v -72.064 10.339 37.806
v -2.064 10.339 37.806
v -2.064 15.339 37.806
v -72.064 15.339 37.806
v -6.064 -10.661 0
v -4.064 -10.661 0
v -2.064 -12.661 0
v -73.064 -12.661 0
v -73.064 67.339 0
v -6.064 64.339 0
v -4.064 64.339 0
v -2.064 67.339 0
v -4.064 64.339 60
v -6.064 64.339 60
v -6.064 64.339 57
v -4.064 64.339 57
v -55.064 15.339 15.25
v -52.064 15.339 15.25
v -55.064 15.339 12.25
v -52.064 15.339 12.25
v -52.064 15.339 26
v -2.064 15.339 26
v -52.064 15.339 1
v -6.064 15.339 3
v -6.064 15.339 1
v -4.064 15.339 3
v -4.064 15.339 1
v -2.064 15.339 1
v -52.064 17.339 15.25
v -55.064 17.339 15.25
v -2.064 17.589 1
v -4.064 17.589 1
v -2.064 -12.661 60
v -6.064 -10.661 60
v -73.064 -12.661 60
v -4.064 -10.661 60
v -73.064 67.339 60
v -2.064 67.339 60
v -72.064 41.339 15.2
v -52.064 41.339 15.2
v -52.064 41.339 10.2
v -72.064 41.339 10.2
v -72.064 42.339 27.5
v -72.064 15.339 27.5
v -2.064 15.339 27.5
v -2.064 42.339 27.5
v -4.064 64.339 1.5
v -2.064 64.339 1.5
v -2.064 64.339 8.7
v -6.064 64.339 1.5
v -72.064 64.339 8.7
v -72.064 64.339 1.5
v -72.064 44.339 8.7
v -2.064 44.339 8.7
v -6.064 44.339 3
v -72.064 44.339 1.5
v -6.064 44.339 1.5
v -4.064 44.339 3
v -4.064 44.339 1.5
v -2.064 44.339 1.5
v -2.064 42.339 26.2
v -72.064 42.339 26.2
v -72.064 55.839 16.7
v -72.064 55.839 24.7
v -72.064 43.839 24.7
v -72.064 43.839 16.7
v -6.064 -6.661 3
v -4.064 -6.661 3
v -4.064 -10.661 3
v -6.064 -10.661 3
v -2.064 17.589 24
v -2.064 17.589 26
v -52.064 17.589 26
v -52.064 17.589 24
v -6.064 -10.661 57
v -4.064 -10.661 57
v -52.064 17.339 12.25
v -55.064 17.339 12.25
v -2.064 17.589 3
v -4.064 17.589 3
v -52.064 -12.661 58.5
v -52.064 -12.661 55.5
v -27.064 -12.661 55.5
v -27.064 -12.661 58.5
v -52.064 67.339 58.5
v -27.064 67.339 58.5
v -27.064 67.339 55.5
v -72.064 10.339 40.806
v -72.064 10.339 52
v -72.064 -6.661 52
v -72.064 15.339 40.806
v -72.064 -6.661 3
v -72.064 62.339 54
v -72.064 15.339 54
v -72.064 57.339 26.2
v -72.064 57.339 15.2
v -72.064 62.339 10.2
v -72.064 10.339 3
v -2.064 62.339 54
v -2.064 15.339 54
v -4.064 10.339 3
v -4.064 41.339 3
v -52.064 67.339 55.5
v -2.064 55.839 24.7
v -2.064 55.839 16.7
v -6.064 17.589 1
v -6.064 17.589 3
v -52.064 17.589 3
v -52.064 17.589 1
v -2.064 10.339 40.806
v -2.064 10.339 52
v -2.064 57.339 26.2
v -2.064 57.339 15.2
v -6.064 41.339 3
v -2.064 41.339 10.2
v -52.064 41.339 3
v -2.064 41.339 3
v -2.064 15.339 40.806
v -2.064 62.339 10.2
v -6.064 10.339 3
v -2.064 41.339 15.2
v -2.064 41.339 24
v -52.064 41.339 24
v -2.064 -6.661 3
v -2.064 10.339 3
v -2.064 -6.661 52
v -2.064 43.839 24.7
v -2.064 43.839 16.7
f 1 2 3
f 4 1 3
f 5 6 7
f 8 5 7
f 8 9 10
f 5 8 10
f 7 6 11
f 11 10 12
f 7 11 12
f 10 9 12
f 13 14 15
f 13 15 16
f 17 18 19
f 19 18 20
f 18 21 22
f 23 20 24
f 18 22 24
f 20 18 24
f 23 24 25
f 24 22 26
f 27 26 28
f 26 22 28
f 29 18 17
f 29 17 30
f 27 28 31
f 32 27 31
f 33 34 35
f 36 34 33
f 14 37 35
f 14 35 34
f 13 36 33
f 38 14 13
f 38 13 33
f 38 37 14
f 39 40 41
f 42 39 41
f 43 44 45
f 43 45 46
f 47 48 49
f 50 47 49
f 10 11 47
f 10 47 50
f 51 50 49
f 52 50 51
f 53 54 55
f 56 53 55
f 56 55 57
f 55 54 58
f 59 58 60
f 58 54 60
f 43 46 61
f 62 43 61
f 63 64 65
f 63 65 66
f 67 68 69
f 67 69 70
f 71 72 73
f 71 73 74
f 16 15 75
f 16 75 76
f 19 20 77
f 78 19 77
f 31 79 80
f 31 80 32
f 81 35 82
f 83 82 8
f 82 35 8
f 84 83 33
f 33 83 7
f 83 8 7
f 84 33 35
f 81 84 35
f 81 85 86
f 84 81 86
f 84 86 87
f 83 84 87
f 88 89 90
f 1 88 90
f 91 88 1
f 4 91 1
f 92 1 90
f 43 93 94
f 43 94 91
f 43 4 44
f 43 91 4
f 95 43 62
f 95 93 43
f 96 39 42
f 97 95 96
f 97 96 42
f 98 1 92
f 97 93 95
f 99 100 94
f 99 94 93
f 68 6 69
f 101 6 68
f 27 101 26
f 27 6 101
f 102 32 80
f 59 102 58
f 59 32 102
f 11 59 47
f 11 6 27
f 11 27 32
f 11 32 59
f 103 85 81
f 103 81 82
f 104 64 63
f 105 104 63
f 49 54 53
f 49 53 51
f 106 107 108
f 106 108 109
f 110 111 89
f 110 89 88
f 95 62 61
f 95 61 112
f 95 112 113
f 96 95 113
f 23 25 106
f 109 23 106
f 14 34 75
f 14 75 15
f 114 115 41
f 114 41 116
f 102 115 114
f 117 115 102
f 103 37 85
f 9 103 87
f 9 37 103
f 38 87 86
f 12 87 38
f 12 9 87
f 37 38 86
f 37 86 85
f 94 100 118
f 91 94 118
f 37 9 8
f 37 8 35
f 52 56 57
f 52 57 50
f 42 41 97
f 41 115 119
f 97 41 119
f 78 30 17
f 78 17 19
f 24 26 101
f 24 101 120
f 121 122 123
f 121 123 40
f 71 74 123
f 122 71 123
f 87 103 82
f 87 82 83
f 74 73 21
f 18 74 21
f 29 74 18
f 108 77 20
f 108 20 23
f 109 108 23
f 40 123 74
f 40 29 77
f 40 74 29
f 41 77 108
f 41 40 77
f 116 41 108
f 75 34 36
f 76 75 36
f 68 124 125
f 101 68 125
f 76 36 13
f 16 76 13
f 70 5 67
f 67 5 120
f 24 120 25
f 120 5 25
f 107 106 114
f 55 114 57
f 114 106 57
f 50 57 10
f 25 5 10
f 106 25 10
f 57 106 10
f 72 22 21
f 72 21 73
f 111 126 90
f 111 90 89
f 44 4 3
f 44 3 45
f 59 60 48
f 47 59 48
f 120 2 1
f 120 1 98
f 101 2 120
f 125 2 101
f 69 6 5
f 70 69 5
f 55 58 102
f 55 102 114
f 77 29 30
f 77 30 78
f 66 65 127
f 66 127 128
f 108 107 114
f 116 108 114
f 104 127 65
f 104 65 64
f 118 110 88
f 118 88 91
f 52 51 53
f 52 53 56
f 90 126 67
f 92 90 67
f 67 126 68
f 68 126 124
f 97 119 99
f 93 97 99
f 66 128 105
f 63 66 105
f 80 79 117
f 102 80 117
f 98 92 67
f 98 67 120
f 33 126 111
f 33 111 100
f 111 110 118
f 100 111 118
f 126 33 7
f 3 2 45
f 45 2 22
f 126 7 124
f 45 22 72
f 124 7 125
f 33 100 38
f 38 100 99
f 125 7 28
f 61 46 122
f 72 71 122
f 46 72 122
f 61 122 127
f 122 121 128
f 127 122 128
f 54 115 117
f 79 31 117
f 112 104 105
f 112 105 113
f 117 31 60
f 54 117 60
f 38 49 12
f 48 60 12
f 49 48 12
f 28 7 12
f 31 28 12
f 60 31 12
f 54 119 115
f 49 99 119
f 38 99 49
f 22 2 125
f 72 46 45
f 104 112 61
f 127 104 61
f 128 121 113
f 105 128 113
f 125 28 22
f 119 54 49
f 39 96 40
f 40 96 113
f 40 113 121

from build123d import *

# Parameters (mm, degrees)
SKETCH_1_W           = 75
SKETCH_1_H           = 80
EXTRUDE_1_DEPTH      = 60
CUT_EXTRUDE_2_DEPTH  = 70
CUT_EXTRUDE_3_DEPTH  = 70
CUT_EXTRUDE_4_DEPTH  = 50
CUT_EXTRUDE_5_DEPTH  = 70
SKETCH_4_W           = 2
SKETCH_4_H           = 75
CUT_EXTRUDE_6_DEPTH  = 3
SKETCH_6_W           = 25
SKETCH_6_H           = 3
CUT_EXTRUDE_7_DEPTH  = 127.249438863
SKETCH_7_W           = 3
SKETCH_7_H           = 2
CUT_EXTRUDE_8_DEPTH  = 3
SKETCH_9_W           = 60
SKETCH_9_H           = 80
CUT_EXTRUDE_11_DEPTH = 4
SKETCH_10_W          = 2
SKETCH_10_H          = 75
CUT_EXTRUDE_12_DEPTH = 3
SKETCH_8_W           = 8
SKETCH_8_H           = 12
SKETCH_8_W_2         = 7.2
SKETCH_8_H_2         = 20
CUT_EXTRUDE_13_DEPTH = 70


with BuildPart() as part:
    # 草图1 → 凸台-拉伸1 (new body)
    with BuildSketch(Plane.XY):
        with Locations((-39.564393939, 27.339015152)):
            Rectangle(SKETCH_1_W, SKETCH_1_H)
    extrude(amount=EXTRUDE_1_DEPTH)

    # 草图2<3> → 切除-拉伸2 (cut)
    with BuildSketch(Plane(origin=(-2.064393939, 0, 0), x_dir=(0, 0, -1), z_dir=(1, 0, 0))):
        Polygon((-54, 62.339015152), (-54, 42.339015152), (-26.2, 42.339015152), (-26.2, 57.339015152), (-15.2, 57.339015152), (-15.2, 41.339015152), (-10.2, 41.339015152), (-10.2, 62.339015152), align=None)
    extrude(amount=-CUT_EXTRUDE_2_DEPTH, mode=Mode.SUBTRACT)

    # 草图2<4> → 切除-拉伸3 (cut)
    with BuildSketch(Plane(origin=(-2.064393939, 0, 0), x_dir=(0, 0, -1), z_dir=(1, 0, 0))):
        Polygon((-27.5, 42.339015152), (-54, 42.339015152), (-54, 15.339015152), (-40.806060925, 15.339015152), (-37.806060925, 15.339015152), (-27.5, 15.339015152), align=None)
    extrude(amount=-CUT_EXTRUDE_3_DEPTH, mode=Mode.SUBTRACT)

    # 草图2<5> → 切除-拉伸4 (cut)
    with BuildSketch(Plane(origin=(-2.064393939, 0, 0), x_dir=(0, 0, -1), z_dir=(1, 0, 0))):
        Polygon((-24, 41.339015152), (-24, 17.589015152), (-26, 17.589015152), (-26, 15.339015152), (-1, 15.339015152), (-1, 17.589015152), (-3, 17.589015152), (-3, 41.339015152), align=None)
    extrude(amount=-CUT_EXTRUDE_4_DEPTH, mode=Mode.SUBTRACT)

    # 草图2 → 切除-拉伸5 (cut)
    with BuildSketch(Plane(origin=(-2.064393939, 0, 0), x_dir=(0, 0, -1), z_dir=(1, 0, 0))):
        Polygon((-37.806060925, 15.339015152), (-40.806060925, 15.339015152), (-40.806060925, 10.339015152), (-52, 10.339015152), (-52, -6.660984848), (-3, -6.660984848), (-3, 10.339015152), (-37.806060925, 10.339015152), align=None)
    extrude(amount=-CUT_EXTRUDE_5_DEPTH, mode=Mode.SUBTRACT)

    # 草图4 → 切除-拉伸6 (cut)
    with BuildSketch(Plane(origin=(0, 0, 0), x_dir=(-1, 0, 0), z_dir=(0, 0, -1))):
        with Locations((5.064393939, 26.839015152)):
            Rectangle(SKETCH_4_W, SKETCH_4_H)
    extrude(amount=-CUT_EXTRUDE_6_DEPTH, mode=Mode.SUBTRACT)

    # 草图6 → 切除-拉伸7 (cut, through all)
    with BuildSketch(Plane(origin=(0, 67.339015152, 0), x_dir=(1, 0, 0), z_dir=(0, 1, 0))):
        with Locations((-39.564393939, -57)):
            Rectangle(SKETCH_6_W, SKETCH_6_H)
    extrude(amount=-CUT_EXTRUDE_7_DEPTH, mode=Mode.SUBTRACT)

    # 草图7 → 切除-拉伸8 (cut)
    with BuildSketch(Plane(origin=(-52.064393939, 0, 0), x_dir=(0, 0, -1), z_dir=(1, 0, 0))):
        with Locations((-13.75, 16.339015152)):
            Rectangle(SKETCH_7_W, SKETCH_7_H)
    extrude(amount=-CUT_EXTRUDE_8_DEPTH, mode=Mode.SUBTRACT)

    # 草图9 → 切除-拉伸11 (cut)
    with BuildSketch(Plane.ZY.offset(77.064393939)):
        with Locations((30, 27.339015152)):
            Rectangle(SKETCH_9_W, SKETCH_9_H)
    extrude(amount=-CUT_EXTRUDE_11_DEPTH, mode=Mode.SUBTRACT)

    # 草图10 → 切除-拉伸12 (cut)
    with BuildSketch(Plane.XY.offset(60)):
        with Locations((-5.064393939, 26.839015152)):
            Rectangle(SKETCH_10_W, SKETCH_10_H)
    extrude(amount=-CUT_EXTRUDE_12_DEPTH, mode=Mode.SUBTRACT)

    # 草图8 → 切除-拉伸13 (cut)
    with BuildSketch(Plane(origin=(-2.064393939, 0, 0), x_dir=(0, 0, -1), z_dir=(1, 0, 0))):
        with Locations((-20.7, 49.839015152)):
            Rectangle(SKETCH_8_W, SKETCH_8_H)
        with Locations((-5.1, 54.339015152)):
            Rectangle(SKETCH_8_W_2, SKETCH_8_H_2)
    extrude(amount=-CUT_EXTRUDE_13_DEPTH, mode=Mode.SUBTRACT)


solid = part.part
